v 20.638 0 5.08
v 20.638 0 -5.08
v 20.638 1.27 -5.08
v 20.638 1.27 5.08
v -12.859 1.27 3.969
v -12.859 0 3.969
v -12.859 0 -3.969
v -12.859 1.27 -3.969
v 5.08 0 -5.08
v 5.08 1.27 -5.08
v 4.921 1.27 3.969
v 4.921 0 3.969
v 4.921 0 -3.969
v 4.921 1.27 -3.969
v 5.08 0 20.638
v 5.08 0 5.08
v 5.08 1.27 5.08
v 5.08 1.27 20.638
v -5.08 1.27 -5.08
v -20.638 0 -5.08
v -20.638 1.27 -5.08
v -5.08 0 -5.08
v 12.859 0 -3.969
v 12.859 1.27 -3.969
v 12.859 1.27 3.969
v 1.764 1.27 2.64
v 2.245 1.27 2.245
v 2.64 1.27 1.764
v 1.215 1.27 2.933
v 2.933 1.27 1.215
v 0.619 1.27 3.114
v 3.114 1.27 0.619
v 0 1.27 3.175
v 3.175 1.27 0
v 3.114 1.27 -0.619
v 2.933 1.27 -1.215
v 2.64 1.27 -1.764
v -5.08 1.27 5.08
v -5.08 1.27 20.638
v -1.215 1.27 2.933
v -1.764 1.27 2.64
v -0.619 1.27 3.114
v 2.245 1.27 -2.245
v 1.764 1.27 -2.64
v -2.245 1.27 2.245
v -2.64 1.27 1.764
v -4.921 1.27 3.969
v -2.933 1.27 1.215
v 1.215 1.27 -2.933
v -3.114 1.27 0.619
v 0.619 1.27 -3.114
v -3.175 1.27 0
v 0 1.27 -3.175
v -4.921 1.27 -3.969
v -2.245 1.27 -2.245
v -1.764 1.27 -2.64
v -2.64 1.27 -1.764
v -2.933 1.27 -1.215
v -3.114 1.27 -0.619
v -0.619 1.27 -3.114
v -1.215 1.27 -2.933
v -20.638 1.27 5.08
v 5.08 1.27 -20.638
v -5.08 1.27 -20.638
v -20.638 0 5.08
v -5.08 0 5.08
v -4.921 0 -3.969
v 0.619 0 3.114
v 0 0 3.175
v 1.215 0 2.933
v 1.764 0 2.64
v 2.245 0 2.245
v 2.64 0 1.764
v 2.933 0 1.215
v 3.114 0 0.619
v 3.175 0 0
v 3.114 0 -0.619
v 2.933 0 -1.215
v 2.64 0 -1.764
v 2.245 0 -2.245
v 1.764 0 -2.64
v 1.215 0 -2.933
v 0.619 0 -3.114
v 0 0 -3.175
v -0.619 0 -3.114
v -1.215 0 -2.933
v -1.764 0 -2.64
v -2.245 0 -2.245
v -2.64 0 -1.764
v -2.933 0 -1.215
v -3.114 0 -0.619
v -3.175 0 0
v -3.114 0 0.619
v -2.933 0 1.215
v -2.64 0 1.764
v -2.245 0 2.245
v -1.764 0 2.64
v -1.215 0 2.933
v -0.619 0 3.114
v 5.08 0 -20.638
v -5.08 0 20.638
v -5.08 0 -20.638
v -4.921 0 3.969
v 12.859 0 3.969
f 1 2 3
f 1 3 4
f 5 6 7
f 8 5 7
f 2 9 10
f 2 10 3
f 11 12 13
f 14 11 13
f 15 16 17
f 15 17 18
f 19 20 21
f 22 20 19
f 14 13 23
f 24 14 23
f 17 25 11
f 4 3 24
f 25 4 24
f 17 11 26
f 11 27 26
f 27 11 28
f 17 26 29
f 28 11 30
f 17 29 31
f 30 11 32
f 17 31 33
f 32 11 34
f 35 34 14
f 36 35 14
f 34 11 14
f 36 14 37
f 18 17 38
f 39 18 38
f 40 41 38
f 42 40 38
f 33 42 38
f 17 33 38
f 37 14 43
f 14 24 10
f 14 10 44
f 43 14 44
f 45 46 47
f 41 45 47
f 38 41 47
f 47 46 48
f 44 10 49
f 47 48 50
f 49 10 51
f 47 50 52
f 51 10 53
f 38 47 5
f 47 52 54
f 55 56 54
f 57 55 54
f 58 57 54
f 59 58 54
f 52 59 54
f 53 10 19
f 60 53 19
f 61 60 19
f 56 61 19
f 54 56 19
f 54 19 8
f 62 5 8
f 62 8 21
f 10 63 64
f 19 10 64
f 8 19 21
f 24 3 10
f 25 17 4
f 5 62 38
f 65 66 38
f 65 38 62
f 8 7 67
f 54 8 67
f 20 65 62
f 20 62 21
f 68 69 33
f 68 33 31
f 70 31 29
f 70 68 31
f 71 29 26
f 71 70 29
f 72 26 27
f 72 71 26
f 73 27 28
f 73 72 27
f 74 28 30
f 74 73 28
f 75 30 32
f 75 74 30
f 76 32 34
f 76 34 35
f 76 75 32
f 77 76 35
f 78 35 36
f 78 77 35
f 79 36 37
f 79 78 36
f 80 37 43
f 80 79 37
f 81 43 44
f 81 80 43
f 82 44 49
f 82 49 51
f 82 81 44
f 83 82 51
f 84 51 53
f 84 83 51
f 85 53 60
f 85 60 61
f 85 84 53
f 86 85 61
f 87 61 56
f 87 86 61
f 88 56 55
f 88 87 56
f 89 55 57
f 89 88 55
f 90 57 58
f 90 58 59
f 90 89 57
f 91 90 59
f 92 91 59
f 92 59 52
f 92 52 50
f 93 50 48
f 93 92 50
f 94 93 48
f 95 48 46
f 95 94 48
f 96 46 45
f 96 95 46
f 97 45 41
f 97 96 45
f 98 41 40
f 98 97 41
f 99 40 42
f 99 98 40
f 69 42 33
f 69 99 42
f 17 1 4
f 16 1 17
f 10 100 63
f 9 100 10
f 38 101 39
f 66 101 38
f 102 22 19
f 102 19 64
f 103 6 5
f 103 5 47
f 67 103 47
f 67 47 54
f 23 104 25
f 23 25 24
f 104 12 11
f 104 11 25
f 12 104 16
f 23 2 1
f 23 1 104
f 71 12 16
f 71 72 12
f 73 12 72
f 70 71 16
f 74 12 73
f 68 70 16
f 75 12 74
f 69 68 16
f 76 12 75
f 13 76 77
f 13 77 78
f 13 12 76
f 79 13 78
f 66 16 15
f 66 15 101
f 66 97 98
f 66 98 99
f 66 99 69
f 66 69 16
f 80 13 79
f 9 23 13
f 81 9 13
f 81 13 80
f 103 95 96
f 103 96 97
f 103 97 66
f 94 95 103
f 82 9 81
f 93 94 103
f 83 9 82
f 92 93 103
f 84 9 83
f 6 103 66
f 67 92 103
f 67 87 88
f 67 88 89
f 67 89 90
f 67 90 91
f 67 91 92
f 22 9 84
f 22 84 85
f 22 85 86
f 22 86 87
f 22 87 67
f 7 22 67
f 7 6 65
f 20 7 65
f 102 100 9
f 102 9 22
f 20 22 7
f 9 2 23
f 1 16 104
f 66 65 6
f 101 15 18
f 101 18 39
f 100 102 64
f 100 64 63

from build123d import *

# Parameters (mm, degrees)
SKETCH1_R           = 3.175
SKETCH1_W           = 7.9375
SKETCH1_H           = 7.9375
BOSS_EXTRUDE1_DEPTH = 1.27


with BuildPart() as part:
    # Sketch1 → Boss-Extrude1 (new body)
    with BuildSketch(Plane(origin=(0, 0, 0), x_dir=(1, 0, 0), z_dir=(0, 1, 0))):
        Polygon((-20.6375, 5.08), (-5.08, 5.08), (-5.08, 20.6375), (5.08, 20.6375), (5.08, 5.08), (20.6375, 5.08), (20.6375, -5.08), (5.08, -5.08), (5.08, -20.6375), (-5.08, -20.6375), (-5.08, -5.08), (-20.6375, -5.08), align=None)
        with Locations(Location((0, 0, 0), (0, 0, 270))):
            Circle(SKETCH1_R, mode=Mode.SUBTRACT)
        with Locations((8.89, 0)):
            Rectangle(SKETCH1_W, SKETCH1_H, mode=Mode.SUBTRACT)
        with Locations((-8.89, 0)):
            Rectangle(SKETCH1_W, SKETCH1_H, mode=Mode.SUBTRACT)
    extrude(amount=BOSS_EXTRUDE1_DEPTH)


solid = part.part
